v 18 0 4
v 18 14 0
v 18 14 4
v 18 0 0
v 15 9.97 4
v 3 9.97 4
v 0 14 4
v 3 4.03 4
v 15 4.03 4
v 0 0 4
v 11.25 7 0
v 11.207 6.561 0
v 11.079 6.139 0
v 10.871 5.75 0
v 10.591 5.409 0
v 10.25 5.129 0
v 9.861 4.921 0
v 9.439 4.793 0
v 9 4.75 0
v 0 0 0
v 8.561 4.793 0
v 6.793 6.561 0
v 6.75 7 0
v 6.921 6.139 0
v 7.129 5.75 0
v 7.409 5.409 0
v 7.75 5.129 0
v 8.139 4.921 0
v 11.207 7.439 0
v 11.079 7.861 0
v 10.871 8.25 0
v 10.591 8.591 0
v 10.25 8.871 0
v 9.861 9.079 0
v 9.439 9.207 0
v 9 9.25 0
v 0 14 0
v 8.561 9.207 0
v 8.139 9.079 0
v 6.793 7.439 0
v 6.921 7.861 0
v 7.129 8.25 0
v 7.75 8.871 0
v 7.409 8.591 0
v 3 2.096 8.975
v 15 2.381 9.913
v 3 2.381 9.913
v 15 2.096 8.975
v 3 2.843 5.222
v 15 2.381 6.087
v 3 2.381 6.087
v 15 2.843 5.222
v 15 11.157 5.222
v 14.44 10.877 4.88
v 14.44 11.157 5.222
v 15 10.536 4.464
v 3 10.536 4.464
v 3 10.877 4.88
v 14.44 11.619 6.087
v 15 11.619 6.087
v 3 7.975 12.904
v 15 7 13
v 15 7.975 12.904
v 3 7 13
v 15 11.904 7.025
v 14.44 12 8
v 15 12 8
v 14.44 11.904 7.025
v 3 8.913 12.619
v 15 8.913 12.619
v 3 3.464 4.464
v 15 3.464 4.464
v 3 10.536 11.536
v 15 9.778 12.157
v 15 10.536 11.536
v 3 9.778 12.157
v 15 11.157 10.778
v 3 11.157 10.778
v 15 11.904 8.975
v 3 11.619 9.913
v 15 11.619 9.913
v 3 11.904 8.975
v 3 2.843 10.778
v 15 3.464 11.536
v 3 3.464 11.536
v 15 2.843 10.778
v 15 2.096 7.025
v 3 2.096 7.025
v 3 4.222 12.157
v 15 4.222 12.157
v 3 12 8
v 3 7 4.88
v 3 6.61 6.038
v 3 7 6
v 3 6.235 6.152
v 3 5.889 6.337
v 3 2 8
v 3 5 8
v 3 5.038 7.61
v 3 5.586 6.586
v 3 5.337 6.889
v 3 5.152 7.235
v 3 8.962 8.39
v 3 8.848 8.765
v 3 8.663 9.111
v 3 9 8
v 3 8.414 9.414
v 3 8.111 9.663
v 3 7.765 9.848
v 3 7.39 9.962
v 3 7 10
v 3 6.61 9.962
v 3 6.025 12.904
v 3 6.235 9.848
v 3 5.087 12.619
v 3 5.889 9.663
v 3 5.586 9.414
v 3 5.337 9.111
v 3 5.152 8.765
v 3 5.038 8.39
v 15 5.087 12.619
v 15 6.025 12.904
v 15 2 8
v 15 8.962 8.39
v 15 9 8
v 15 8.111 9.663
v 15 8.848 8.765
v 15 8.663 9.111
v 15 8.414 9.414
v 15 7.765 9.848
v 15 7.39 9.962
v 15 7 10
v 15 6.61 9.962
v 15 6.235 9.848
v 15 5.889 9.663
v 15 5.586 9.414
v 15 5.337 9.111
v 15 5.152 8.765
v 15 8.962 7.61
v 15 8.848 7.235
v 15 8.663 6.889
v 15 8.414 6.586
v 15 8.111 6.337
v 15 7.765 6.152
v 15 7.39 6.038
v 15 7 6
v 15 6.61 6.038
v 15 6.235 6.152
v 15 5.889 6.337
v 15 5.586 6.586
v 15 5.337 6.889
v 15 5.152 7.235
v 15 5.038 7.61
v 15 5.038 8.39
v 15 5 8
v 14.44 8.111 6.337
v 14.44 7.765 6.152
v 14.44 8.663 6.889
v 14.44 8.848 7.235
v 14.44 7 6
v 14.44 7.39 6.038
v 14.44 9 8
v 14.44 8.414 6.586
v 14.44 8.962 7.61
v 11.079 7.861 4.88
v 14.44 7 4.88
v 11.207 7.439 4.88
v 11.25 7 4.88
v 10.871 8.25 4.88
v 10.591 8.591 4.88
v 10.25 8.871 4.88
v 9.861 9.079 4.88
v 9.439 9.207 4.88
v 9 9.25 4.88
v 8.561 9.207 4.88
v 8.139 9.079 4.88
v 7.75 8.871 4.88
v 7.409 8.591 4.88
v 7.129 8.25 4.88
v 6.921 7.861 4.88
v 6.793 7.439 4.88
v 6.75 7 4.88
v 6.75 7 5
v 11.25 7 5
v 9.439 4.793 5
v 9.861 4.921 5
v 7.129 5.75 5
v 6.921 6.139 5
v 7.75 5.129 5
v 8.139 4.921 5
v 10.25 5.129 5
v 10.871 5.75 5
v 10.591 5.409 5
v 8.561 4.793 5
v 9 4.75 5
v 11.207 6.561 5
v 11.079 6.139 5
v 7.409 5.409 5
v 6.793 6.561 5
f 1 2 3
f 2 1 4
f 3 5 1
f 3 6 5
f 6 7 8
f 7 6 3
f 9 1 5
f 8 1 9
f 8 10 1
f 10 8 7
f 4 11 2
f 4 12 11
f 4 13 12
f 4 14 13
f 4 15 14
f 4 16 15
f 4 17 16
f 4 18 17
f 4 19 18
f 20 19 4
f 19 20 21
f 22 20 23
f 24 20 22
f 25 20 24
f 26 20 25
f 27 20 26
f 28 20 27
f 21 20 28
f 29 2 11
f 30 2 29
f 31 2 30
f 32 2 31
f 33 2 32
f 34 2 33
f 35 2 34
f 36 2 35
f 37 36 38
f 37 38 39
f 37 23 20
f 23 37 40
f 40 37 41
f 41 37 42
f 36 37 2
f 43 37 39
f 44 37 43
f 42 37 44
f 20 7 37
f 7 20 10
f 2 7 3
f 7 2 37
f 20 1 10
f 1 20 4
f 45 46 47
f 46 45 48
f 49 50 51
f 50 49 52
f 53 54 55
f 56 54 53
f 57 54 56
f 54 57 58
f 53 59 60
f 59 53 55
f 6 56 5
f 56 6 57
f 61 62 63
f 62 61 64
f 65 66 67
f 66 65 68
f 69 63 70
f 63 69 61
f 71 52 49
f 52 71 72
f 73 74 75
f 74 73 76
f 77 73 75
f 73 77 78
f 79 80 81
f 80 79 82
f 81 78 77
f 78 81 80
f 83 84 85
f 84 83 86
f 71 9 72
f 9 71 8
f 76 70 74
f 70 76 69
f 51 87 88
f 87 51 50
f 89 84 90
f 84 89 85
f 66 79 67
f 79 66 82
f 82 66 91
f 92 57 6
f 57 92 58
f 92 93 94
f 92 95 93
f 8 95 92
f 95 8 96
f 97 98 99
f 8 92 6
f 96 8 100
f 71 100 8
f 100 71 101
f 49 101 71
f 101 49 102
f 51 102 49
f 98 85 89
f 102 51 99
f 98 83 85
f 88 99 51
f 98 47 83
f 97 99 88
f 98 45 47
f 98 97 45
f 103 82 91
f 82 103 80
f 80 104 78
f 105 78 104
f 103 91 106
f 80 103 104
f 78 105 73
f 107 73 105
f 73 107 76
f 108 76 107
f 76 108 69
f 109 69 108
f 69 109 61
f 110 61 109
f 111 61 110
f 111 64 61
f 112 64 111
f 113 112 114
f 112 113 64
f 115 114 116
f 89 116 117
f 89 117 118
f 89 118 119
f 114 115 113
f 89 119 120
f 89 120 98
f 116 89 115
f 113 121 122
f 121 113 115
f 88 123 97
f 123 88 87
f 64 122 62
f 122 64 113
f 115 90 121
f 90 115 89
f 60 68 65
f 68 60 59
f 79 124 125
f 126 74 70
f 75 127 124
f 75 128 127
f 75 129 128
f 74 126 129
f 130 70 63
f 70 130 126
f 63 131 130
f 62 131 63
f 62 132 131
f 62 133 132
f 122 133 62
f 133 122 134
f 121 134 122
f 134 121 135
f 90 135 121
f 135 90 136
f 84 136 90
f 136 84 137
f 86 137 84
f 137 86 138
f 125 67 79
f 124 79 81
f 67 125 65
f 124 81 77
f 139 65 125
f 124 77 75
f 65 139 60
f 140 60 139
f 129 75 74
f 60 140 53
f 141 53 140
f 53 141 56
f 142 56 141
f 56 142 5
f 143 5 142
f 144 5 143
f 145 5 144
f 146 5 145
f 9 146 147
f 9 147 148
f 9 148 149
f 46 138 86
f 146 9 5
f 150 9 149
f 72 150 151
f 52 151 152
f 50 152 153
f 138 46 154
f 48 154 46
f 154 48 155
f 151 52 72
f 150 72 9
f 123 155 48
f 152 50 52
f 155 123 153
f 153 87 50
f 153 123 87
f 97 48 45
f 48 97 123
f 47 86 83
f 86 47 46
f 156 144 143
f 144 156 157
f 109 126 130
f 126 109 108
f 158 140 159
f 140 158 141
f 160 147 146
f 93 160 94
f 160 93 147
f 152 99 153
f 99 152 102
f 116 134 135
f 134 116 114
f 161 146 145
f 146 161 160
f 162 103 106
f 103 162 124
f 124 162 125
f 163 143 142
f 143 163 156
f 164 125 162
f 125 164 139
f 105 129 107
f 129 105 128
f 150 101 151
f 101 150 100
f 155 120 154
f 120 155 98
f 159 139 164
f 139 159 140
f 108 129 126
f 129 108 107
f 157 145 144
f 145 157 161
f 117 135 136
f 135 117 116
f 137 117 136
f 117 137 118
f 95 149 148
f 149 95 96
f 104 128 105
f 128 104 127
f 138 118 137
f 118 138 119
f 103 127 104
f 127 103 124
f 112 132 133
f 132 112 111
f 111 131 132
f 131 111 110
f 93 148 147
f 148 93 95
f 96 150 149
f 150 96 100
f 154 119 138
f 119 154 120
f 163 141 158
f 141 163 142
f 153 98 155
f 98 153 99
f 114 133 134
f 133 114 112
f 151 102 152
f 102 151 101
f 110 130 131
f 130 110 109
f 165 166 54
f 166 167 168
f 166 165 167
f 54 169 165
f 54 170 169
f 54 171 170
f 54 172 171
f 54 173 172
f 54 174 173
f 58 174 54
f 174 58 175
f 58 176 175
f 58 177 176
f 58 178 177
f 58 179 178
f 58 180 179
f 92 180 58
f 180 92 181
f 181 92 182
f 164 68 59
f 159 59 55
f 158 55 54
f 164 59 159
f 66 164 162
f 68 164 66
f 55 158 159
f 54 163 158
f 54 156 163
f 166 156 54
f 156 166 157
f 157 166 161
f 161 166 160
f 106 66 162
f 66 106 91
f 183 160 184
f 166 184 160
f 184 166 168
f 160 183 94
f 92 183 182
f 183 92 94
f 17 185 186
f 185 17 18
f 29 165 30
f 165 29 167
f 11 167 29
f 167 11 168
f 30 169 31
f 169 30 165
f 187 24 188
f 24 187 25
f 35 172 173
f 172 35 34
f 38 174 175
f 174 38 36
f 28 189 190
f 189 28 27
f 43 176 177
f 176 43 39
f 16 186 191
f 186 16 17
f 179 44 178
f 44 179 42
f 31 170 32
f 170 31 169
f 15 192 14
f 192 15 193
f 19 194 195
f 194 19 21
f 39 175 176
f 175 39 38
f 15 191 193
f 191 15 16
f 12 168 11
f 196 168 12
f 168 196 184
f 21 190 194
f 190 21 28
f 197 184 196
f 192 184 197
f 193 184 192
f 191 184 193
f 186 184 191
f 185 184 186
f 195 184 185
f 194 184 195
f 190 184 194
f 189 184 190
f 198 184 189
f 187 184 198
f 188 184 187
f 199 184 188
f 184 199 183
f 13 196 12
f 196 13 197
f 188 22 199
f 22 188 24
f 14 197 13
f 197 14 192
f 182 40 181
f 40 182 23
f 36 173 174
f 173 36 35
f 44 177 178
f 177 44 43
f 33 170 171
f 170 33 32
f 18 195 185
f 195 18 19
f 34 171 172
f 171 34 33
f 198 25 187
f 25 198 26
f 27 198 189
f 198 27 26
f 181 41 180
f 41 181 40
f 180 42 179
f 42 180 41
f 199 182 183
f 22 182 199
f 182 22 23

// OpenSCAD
$fn = 32;

// ----------------------------------------------------------------------
// Cable clip: cable 4 mm, clamp 10 mm, base 18 mm
// ----------------------------------------------------------------------

// --- parameters (mm) ---
foot_w = 18;              // base length, X
foot_d = 14;              // base width, Y
foot_t = 4;               // base thickness
hose_seat_d = 10;         // clamp outside diameter
ring_t = 3;               // clamp wall
cable_d = 4;              // cable opening
ring_w = 12;              // clamp width along the cable
screw_d = 4.5;            // screw clearance
throat = 3.12;            // snap throat width
sink = 1;                 // overlap of the clamp into the base

module base() {
  cube([foot_w, foot_d, foot_t]);
}

module clamp() {
  translate([foot_w / 2, foot_d / 2, foot_t + hose_seat_d / 2 - sink]) rotate([0, 90, 0])
    cylinder(h = ring_w, d = hose_seat_d, center = true);
}

difference() {
  union() {
    base();
    clamp();
  }
  translate([foot_w / 2, foot_d / 2, foot_t + hose_seat_d / 2 - sink]) rotate([0, 90, 0]) translate([0, 0, -ring_w / 2 - 1]) cylinder(h = ring_w + 2, d = cable_d);
  /* snap throat: the opening is narrower than the cable */
  translate([foot_w / 2 - throat / 2, foot_d / 2, foot_t + hose_seat_d / 2 - sink]) rotate([0, 90, 0]) translate([0, 0, -ring_w / 2 - 1]) cube([throat, hose_seat_d + 2, ring_w + 2]);
  translate([9, foot_d / 2, -1]) cylinder(h = foot_t + 2, d = screw_d);
}
